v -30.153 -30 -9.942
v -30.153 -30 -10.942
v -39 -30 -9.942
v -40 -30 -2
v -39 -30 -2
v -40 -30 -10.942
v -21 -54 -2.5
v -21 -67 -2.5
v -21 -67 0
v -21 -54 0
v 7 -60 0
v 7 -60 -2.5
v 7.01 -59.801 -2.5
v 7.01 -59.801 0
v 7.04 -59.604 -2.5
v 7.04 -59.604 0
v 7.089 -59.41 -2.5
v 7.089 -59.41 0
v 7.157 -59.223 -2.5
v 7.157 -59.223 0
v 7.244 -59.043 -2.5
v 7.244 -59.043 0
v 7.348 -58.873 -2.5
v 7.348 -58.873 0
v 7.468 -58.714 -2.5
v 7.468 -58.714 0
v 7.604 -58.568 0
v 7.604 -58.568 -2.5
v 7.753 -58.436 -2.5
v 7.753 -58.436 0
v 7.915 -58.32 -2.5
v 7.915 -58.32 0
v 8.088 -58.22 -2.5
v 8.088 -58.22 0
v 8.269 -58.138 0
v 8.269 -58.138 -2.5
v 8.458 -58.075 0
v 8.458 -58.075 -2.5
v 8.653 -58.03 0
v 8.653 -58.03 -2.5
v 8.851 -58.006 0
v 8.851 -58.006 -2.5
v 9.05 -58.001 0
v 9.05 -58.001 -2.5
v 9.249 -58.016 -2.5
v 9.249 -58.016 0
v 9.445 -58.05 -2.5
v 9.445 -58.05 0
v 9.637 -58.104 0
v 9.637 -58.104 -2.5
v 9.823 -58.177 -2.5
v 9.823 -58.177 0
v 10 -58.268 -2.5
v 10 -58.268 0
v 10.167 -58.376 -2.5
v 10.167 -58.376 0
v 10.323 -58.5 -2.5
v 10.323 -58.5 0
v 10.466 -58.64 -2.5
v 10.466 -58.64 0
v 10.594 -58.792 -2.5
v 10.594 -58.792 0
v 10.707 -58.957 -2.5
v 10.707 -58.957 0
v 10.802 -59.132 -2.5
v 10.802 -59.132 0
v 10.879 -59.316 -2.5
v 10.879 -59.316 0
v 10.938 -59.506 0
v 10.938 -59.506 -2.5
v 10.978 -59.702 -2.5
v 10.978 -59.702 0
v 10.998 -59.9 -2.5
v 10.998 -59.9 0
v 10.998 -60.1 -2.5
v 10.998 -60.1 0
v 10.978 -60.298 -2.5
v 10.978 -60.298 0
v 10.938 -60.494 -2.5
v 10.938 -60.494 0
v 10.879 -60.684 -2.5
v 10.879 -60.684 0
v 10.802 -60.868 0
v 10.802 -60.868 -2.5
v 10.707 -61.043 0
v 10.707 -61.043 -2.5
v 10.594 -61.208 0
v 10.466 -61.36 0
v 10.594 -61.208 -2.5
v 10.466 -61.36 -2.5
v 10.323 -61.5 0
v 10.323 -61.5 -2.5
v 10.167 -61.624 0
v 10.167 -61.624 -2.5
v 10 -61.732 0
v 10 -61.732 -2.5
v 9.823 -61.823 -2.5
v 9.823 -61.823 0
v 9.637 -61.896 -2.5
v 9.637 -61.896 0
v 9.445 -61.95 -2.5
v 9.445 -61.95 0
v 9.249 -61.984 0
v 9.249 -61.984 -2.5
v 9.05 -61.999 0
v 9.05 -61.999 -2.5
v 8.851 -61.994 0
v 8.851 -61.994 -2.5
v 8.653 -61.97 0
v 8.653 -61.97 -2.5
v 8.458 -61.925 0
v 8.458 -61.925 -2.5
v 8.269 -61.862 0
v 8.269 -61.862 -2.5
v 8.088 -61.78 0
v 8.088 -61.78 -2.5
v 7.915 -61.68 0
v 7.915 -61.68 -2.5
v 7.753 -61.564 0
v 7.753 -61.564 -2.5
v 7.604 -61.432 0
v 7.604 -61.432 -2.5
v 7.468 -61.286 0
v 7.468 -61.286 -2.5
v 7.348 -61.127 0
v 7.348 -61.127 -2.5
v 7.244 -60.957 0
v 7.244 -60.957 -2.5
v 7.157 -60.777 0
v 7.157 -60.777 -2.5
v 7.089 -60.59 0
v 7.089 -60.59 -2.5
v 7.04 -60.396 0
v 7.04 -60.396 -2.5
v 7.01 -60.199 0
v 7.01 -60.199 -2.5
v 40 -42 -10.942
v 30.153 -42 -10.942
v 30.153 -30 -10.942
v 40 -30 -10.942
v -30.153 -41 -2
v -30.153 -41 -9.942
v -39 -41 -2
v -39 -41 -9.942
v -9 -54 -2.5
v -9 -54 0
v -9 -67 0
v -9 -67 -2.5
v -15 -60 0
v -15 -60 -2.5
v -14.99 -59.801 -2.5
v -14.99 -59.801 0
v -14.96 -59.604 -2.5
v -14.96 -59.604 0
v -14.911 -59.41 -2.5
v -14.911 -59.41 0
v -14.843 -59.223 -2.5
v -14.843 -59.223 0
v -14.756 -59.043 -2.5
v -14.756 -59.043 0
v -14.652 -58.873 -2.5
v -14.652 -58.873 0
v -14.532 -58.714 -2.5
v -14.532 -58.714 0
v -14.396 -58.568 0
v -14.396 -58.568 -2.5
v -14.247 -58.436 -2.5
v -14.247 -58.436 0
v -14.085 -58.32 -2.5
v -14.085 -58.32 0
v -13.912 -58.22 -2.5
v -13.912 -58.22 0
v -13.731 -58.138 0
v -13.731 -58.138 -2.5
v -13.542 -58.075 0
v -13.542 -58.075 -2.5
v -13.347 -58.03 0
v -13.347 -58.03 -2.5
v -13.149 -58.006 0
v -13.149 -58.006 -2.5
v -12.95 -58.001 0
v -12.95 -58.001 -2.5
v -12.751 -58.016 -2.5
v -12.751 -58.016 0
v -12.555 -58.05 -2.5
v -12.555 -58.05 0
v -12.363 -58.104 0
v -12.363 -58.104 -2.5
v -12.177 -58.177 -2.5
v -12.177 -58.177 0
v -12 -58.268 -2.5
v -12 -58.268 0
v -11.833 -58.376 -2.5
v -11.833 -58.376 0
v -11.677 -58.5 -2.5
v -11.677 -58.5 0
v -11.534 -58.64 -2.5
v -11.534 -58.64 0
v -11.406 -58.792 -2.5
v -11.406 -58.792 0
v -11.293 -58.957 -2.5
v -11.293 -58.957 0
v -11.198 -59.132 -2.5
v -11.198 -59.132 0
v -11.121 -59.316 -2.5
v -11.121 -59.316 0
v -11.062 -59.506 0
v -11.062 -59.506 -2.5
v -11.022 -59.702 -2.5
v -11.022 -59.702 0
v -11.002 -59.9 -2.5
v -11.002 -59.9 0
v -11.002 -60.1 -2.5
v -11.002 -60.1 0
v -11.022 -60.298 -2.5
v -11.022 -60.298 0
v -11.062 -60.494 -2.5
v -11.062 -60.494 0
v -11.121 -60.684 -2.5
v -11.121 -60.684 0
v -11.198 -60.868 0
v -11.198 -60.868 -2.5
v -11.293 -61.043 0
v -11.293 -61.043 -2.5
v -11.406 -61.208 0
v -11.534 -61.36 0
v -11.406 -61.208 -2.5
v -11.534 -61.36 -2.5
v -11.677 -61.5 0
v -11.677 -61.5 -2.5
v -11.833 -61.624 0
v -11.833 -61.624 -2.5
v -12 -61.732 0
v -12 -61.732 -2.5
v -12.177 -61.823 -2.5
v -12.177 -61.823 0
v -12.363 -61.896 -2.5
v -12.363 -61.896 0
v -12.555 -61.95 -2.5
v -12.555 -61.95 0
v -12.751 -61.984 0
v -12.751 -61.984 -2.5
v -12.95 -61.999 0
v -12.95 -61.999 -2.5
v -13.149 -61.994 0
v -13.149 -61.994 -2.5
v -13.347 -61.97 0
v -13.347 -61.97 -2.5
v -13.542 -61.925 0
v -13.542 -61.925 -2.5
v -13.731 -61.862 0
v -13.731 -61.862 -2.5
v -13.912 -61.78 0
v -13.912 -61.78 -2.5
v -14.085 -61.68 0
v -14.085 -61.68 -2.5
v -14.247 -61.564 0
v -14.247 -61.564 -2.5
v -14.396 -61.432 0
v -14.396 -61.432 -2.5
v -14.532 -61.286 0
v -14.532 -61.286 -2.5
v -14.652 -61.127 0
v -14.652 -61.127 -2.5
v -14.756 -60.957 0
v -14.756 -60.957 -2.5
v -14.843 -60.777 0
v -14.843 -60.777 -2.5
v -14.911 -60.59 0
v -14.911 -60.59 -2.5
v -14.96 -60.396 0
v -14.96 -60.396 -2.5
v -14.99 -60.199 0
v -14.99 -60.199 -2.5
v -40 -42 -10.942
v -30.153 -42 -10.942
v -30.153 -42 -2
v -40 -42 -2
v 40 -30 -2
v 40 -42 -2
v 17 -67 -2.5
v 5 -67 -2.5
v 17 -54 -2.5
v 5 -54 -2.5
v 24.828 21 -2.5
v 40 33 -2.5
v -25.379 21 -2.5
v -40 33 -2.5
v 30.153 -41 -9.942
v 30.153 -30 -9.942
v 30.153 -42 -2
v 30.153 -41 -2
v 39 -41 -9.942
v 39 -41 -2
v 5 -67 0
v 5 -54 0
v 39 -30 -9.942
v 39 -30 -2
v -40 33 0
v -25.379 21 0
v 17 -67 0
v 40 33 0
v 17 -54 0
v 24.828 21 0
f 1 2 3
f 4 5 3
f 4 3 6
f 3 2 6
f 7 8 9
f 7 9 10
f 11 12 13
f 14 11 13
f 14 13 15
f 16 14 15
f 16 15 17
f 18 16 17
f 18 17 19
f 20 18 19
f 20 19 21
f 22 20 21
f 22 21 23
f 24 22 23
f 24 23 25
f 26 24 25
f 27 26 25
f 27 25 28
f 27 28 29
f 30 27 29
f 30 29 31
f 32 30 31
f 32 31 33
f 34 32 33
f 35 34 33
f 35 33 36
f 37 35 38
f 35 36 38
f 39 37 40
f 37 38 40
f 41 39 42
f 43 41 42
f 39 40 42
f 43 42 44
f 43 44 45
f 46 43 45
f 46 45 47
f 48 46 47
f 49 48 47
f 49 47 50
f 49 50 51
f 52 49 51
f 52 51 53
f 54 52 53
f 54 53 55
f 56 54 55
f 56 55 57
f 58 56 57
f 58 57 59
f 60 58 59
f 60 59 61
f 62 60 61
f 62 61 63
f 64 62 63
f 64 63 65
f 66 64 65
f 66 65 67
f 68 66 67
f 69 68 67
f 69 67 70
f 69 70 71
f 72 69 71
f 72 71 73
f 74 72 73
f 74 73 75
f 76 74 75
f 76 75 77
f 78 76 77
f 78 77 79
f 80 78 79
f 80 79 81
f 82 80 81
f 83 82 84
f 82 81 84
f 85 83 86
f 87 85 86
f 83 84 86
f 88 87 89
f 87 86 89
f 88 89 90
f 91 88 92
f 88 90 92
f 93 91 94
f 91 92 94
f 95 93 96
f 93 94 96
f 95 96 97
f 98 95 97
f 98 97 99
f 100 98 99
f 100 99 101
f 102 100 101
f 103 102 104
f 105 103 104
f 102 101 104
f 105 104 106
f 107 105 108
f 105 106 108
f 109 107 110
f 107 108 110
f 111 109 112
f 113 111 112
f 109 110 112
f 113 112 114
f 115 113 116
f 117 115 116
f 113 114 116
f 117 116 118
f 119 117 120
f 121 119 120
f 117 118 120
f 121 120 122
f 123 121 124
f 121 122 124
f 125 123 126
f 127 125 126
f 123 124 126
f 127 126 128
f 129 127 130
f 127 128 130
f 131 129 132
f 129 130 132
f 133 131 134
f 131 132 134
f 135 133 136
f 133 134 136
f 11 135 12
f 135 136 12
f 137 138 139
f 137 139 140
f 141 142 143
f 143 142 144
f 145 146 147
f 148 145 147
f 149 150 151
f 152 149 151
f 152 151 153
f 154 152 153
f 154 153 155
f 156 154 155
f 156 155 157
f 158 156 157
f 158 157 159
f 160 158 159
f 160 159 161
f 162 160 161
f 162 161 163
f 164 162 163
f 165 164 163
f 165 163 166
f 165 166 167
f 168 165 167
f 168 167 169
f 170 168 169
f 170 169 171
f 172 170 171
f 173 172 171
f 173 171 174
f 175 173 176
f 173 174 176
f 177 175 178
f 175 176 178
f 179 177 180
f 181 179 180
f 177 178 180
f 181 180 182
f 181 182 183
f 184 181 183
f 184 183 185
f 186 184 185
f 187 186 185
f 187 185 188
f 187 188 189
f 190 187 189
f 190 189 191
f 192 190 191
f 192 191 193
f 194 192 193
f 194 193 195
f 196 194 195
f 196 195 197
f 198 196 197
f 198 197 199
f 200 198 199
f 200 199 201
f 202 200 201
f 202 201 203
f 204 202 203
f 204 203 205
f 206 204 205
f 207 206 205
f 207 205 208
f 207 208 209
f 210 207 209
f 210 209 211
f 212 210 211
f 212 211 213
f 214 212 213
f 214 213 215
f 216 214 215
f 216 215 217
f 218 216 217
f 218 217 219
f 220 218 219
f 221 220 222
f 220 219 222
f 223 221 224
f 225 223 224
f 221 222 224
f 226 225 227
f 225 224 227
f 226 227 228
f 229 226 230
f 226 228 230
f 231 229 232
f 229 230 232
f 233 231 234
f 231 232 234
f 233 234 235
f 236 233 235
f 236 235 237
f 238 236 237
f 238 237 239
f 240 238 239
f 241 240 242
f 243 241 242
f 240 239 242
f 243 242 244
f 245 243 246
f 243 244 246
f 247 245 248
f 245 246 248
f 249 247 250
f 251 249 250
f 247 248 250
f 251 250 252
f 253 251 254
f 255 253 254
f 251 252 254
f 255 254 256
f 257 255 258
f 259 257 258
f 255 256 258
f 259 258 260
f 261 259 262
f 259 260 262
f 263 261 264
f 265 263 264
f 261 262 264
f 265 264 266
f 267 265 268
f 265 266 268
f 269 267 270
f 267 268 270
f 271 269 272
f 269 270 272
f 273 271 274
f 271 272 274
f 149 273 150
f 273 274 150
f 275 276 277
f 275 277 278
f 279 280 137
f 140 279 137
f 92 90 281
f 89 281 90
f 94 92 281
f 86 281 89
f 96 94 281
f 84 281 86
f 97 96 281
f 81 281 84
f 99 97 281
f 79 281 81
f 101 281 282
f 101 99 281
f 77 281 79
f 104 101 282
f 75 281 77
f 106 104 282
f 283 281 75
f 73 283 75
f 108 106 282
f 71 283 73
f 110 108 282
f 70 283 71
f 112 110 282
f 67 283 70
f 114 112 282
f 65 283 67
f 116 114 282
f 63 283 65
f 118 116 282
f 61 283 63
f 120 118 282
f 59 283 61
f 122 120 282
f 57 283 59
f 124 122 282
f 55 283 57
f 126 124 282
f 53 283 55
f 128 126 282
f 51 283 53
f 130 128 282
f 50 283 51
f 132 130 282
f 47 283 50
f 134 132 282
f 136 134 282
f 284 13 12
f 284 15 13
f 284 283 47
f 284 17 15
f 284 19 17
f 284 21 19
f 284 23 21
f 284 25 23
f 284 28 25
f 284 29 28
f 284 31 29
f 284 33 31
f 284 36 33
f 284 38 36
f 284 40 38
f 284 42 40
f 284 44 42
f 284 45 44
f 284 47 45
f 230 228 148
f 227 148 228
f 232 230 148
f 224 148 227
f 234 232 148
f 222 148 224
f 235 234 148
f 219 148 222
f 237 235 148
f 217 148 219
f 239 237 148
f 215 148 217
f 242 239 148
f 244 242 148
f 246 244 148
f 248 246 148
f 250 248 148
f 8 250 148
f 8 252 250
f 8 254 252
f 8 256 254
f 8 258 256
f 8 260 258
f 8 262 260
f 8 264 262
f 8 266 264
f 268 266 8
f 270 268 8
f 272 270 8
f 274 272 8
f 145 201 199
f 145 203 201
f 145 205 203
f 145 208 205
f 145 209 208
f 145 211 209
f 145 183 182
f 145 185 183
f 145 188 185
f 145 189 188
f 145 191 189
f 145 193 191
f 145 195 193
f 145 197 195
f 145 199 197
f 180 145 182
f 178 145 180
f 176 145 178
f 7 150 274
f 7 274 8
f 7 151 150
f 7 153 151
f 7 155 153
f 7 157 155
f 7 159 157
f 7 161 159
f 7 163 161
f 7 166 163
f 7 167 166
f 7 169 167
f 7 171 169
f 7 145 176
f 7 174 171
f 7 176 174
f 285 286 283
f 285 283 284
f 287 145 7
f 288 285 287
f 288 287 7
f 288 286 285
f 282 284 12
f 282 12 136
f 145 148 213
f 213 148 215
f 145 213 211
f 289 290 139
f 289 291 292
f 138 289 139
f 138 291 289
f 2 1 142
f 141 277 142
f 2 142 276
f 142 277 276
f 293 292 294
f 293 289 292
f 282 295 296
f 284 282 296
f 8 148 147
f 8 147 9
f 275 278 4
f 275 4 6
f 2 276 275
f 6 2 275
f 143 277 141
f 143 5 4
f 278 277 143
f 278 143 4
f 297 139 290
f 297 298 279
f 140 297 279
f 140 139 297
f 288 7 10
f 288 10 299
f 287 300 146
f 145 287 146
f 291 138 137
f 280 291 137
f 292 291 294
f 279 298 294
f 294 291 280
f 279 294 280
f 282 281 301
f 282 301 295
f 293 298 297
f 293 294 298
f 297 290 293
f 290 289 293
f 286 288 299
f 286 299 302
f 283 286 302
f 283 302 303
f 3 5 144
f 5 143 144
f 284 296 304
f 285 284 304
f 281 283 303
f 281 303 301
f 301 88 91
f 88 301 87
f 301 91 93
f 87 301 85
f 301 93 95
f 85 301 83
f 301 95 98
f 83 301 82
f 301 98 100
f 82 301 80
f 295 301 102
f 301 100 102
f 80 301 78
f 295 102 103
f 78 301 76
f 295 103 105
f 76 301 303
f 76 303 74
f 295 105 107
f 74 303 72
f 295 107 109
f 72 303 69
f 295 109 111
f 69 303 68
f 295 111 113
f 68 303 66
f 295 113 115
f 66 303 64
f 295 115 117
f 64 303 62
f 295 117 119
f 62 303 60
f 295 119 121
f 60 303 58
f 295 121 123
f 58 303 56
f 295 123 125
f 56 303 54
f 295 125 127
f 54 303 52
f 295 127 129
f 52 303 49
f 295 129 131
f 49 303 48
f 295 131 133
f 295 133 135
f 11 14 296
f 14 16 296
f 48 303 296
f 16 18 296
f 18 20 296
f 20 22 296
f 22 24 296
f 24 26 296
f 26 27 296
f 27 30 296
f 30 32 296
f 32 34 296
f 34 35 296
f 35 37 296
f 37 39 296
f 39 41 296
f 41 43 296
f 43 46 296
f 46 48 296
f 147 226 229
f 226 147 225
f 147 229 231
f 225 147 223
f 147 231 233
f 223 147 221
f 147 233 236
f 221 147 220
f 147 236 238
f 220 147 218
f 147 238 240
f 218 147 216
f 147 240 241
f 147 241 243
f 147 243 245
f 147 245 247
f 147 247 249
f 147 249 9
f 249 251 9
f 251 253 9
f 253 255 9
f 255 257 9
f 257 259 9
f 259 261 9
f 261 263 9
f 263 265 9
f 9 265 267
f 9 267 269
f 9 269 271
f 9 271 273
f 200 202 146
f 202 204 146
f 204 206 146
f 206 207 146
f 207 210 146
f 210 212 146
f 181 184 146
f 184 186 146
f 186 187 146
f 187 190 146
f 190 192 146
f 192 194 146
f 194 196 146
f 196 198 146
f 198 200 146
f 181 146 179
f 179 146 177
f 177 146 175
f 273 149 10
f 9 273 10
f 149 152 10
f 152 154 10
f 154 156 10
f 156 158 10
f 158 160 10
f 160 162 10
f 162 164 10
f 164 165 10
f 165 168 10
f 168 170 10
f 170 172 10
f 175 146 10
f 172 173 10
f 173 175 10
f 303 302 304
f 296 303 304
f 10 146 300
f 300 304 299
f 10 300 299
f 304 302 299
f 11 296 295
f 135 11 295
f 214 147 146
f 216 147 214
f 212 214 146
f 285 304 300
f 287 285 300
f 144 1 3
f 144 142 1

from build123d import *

# Parameters (mm, degrees)
RESSALTO_EXTRUS_O1_DEPTH       = 2.5
CORTE_EXTRUS_O1_DEPTH          = 3.5
FURO_DE_DI_METRO_4_0_4_1_D     = 4
FURO_DE_DI_METRO_4_0_4_1_DEPTH = 2.5
ESBO_O7_W                      = 9.846619962
ESBO_O7_H                      = 8.942122463
RESSALTO_EXTRUS_O2_DEPTH       = 12
CASCA1_T                       = -1


with BuildPart() as part:
    # Esboço1 → Ressalto-extrusão1 (new body)
    with BuildSketch(Plane(origin=(0, 0, -2.5), x_dir=(-1, 0, 0), z_dir=(0, 0, -1))):
        Polygon((-17, -54), (-17, -67), (21, -67), (21, -54), (40, 33), (-40, 33), align=None)
    extrude(amount=-RESSALTO_EXTRUS_O1_DEPTH)

    # Esboço2 → Corte-extrusão1 (cut, through all)
    with BuildSketch(Plane.XY):
        Polygon((-9, -67), (5, -67), (5, -54), (24.827586207, 21), (-25.379310345, 21), (-9, -54), align=None)
    extrude(amount=-CORTE_EXTRUS_O1_DEPTH, mode=Mode.SUBTRACT)

    # Furo de diâmetro Ø4.0 (4)1
    with Locations(Plane.XY):
        with Locations((-13, -60), (9, -60)):
            Hole(FURO_DE_DI_METRO_4_0_4_1_D / 2, depth=FURO_DE_DI_METRO_4_0_4_1_DEPTH)


with BuildPart() as body_2:
    # Esboço7 → Ressalto-extrusão2 (new body)
    with BuildSketch(Plane(origin=(0, -42, 0), x_dir=(1, 0, 0), z_dir=(0, 1, 0))):
        with Locations((35.076690019, 6.471061232)):
            Rectangle(ESBO_O7_W, ESBO_O7_H)
    extrude(amount=RESSALTO_EXTRUS_O2_DEPTH)

    # Casca1
    casca1_openings = [body_2.faces().sort_by_distance(p)[0] for p in [
        (35.076690019, -30, -6.471061231),
        (35.076690019, -36, -2),
        (30.153380038, -36, -6.471061231),
    ]]
    offset(amount=CASCA1_T, openings=casca1_openings, kind=Kind.INTERSECTION)


with BuildPart() as body_3:
    # Espelhar3: mirrored copy
    add(body_2.part.mirror(Plane(origin=(0, 0, 0), x_dir=(0, 0, 1), z_dir=(1, 0, 0))))


solid = Compound([part.part, body_2.part, body_3.part])
